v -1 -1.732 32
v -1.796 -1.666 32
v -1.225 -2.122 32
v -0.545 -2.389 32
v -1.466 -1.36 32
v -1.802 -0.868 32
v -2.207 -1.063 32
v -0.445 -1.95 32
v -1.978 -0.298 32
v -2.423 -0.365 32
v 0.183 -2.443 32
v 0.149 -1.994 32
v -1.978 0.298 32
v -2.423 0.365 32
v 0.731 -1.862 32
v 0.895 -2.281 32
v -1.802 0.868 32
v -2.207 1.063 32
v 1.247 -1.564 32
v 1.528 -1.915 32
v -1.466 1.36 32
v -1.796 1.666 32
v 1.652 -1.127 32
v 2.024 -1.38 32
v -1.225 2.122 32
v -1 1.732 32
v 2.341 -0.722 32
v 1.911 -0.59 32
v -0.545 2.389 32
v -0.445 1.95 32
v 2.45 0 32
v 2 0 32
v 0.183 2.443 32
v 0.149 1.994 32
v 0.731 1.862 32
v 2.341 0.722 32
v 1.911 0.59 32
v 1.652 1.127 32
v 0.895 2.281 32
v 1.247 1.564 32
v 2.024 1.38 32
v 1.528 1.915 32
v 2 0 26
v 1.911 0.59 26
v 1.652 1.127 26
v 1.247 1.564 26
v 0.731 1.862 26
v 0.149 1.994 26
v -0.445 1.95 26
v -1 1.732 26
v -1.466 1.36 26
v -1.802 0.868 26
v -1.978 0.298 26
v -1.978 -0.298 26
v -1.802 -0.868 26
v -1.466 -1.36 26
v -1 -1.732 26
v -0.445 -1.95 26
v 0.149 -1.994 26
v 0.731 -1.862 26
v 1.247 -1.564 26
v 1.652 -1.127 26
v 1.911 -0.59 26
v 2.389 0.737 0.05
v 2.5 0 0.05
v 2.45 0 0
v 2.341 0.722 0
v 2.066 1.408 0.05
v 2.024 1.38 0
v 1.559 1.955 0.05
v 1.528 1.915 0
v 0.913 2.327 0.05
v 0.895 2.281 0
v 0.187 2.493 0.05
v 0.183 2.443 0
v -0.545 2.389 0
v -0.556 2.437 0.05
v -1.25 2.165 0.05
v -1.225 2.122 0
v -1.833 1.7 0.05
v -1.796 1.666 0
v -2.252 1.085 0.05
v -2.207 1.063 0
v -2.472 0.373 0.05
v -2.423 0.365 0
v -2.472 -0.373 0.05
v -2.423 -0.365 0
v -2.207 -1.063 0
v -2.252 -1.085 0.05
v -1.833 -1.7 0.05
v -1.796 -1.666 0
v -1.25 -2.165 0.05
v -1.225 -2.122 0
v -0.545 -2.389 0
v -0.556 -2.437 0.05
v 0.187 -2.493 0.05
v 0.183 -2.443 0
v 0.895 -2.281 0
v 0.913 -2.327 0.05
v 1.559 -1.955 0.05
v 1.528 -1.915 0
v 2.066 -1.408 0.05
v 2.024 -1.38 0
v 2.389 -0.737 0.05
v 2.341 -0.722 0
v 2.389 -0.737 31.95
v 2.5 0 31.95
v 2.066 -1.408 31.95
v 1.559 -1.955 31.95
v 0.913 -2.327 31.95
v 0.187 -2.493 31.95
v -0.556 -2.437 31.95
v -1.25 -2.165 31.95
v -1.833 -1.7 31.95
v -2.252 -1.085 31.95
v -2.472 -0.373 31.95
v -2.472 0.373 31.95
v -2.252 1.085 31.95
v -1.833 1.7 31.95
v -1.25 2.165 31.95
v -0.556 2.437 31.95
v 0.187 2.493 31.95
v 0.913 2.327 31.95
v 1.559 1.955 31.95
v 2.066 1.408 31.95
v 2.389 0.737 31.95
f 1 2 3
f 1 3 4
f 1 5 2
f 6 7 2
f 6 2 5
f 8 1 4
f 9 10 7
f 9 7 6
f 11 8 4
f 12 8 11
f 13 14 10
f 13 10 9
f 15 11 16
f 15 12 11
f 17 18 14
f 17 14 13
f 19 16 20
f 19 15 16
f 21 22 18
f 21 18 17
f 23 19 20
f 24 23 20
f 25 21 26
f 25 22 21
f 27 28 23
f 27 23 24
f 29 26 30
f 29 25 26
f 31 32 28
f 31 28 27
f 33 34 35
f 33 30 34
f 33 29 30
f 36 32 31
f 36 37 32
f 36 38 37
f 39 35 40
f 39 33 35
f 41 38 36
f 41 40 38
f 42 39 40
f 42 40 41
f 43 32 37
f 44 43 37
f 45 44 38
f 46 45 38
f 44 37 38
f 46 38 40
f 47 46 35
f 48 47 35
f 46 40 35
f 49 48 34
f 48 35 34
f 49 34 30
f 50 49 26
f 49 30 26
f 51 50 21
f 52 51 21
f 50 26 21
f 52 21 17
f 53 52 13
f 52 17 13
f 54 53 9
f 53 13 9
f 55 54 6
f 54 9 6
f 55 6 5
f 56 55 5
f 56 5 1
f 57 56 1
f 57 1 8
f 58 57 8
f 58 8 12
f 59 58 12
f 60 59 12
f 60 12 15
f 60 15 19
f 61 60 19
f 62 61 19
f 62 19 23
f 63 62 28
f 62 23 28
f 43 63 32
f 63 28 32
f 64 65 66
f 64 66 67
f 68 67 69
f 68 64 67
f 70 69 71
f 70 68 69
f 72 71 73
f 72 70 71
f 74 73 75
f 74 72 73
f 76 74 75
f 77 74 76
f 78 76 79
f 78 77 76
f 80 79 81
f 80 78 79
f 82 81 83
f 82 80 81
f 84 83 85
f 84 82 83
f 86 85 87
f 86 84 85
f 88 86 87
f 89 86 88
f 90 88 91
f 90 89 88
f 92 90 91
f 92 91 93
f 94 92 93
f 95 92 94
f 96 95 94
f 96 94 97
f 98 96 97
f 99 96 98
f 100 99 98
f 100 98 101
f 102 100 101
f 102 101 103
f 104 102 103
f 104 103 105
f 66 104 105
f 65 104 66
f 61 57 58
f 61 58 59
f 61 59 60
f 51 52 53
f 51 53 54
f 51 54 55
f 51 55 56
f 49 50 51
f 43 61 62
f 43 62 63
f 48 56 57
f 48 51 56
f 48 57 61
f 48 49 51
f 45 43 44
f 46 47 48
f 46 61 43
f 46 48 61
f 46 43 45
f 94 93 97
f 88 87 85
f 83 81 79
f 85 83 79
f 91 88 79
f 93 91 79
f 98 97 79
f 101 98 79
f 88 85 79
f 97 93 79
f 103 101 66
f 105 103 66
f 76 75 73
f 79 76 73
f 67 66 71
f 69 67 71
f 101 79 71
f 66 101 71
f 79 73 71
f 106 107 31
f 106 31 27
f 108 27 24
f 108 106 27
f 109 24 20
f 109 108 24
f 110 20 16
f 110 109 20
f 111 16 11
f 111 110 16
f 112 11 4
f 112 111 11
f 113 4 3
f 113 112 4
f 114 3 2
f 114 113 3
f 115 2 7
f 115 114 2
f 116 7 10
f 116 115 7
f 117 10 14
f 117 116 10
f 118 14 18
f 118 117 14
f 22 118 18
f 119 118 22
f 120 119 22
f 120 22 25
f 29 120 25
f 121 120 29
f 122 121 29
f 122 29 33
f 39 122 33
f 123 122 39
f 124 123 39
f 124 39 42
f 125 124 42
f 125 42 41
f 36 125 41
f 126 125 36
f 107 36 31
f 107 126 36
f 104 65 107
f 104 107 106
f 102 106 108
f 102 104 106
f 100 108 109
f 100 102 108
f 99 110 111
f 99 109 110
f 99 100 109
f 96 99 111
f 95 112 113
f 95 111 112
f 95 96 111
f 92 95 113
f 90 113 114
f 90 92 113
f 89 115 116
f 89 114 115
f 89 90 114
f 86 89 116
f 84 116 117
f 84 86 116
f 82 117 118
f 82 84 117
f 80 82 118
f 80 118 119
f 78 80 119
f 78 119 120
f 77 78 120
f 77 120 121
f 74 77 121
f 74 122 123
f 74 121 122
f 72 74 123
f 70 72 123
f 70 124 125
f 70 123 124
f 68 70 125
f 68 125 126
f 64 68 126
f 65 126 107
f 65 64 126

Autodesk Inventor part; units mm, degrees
ref_plane "YZ Plane" through (0, 0, 0) normal (1, 0, 0) x (0, 1, 0)
ref_plane "XZ Plane" through (0, 0, 0) normal (0, 1, 0) x (-1, 0, 0)
ref_plane "XY Plane" through (0, 0, 0) normal (0, 0, 1) x (1, 0, 0)
sketch "スケッチ1" plane through (0, 0, 0) normal (0, 0, 1) x (1, 0, 0)
  circle A0 centre (0, 0) radius 2.5
  dimension "d0" = 5
extrude "押し出し1" add sketch "スケッチ1" along normal blind 32
sketch "スケッチ2" plane through (0, 0, 32) normal (0, 0, 1) x (1, 0, 0)
  circle A0 centre (0, 0) radius 2
  dimension "d3" = 4
extrude "押し出し2" cut sketch "スケッチ2" against normal blind 6
thread "ねじ1" size "M4x0.7" class "6H" standard "ANSI Metric M Profile" full length
chamfer "面取り1" distance 0.05 angle 45 2 edges at (-2.5, 0, 32) (-2.5, 0, 0)
properties part number "shaft_31.6mm_Φ5" material "アルミニウム 7075"
